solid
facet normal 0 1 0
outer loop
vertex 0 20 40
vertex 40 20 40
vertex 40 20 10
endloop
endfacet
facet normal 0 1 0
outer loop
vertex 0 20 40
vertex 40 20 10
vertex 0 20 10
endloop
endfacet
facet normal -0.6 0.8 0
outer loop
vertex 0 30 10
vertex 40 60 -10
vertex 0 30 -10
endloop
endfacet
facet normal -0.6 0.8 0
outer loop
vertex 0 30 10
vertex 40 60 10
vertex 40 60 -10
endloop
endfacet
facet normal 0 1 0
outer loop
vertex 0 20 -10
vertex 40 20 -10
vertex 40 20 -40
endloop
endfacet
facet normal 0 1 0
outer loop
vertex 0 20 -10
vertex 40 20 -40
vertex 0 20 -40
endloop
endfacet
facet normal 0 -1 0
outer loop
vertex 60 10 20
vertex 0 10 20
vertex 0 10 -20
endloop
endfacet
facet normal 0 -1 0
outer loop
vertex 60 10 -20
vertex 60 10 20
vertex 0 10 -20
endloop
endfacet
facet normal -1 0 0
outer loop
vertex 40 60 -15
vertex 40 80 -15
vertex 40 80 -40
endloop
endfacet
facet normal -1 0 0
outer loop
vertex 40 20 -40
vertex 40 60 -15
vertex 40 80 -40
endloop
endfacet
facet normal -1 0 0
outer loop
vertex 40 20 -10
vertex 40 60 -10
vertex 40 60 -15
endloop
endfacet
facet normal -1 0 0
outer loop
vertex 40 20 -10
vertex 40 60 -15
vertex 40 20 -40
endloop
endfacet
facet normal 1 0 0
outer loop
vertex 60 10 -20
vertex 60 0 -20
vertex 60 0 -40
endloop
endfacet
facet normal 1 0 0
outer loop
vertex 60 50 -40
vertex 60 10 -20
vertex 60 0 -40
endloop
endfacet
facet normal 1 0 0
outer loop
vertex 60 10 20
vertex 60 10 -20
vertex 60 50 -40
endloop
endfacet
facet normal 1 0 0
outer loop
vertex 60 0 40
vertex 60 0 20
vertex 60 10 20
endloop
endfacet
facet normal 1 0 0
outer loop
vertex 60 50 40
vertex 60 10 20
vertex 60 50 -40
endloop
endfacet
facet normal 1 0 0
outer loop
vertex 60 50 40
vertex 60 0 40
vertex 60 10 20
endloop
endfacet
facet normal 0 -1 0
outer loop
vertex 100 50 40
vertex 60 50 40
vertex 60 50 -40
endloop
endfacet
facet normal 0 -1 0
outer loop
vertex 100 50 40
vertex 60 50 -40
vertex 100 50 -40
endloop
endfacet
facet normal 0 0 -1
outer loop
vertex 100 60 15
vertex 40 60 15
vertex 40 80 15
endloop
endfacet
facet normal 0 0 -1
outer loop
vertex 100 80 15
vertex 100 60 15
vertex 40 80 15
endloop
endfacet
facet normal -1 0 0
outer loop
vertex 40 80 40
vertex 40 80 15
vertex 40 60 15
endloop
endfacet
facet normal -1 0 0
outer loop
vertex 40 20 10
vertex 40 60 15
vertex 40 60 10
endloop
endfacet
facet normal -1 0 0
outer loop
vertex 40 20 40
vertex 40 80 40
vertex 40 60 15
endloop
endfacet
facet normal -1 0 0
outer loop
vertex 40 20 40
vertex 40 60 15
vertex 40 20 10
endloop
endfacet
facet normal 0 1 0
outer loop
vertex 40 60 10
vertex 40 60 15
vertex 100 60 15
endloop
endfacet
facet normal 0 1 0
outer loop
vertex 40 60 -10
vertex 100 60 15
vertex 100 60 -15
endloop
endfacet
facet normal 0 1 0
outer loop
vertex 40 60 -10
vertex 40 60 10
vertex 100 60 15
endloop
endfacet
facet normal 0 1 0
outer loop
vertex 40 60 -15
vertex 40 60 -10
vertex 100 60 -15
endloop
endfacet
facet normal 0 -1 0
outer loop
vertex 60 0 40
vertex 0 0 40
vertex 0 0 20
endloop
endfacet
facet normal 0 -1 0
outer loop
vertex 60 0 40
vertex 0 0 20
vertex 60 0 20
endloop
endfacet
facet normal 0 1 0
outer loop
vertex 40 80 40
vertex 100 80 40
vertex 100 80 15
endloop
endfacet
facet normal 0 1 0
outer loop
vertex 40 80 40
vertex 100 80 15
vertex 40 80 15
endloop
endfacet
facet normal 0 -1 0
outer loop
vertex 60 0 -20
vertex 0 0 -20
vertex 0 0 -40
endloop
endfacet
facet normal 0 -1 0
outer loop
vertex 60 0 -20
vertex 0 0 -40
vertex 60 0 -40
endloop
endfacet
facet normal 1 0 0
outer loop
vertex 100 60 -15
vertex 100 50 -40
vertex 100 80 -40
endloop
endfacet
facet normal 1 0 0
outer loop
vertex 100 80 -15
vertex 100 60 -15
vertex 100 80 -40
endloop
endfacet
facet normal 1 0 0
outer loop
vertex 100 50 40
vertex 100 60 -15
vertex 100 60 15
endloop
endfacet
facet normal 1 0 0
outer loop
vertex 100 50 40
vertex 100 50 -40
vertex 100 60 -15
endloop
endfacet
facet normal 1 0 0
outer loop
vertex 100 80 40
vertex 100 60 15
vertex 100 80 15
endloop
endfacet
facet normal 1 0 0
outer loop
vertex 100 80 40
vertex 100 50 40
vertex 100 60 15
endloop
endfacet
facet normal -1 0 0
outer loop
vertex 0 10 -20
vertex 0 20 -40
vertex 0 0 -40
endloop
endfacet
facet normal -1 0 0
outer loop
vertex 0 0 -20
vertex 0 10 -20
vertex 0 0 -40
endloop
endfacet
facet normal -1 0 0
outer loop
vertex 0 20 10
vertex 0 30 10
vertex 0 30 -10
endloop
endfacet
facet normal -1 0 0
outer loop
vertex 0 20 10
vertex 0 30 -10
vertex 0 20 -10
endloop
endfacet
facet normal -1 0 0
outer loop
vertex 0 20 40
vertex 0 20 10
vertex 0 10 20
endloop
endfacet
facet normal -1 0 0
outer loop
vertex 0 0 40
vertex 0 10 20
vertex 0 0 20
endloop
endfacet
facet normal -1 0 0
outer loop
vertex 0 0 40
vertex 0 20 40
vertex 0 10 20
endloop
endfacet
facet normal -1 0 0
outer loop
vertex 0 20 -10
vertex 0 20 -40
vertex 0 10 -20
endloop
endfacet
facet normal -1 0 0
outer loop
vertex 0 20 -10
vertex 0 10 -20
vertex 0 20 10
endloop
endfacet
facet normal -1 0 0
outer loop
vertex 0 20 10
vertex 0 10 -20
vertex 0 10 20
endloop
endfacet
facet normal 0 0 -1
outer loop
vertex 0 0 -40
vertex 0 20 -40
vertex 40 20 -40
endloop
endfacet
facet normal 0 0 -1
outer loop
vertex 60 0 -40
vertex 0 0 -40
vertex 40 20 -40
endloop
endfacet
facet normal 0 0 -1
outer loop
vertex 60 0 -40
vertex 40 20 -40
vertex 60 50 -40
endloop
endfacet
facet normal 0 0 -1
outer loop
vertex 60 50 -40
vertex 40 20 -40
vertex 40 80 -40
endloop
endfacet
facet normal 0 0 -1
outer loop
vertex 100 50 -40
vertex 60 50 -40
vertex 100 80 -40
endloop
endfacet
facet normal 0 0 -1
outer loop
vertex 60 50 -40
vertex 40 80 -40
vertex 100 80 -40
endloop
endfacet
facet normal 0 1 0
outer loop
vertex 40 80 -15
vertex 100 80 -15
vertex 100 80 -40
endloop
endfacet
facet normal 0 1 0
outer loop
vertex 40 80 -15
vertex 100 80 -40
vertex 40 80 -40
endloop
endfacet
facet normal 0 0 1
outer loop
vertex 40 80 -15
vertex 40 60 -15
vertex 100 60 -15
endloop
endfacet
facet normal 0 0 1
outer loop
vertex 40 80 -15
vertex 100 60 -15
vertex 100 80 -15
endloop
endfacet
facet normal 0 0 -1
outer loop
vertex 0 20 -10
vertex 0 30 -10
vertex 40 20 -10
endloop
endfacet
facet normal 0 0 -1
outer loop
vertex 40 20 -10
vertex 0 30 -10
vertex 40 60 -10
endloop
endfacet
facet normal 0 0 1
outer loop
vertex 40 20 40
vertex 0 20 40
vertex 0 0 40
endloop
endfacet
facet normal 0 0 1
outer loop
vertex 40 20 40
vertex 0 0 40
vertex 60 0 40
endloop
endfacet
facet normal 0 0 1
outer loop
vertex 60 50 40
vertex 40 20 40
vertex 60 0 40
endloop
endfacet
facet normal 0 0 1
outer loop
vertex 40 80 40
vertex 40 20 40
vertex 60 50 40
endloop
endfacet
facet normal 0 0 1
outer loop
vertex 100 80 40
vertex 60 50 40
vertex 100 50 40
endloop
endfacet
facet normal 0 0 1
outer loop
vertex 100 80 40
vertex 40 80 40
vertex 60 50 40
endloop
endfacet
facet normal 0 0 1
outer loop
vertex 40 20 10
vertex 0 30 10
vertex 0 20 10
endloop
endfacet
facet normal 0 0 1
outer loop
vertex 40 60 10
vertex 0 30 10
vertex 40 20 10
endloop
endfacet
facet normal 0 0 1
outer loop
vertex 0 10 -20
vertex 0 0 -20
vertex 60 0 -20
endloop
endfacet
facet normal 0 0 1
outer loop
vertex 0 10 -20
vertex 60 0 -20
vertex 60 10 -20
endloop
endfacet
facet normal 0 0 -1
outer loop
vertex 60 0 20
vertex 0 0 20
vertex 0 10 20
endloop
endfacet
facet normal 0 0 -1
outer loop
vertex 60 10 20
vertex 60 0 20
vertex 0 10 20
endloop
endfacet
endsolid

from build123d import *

# Parameters (mm, degrees)
BOSS_EXTRUDE1_DEPTH = 40
BOSS_EXTRUDE2_DEPTH = 10
SKETCH2_W           = 40
SKETCH2_H           = 10
SKETCH2_W_2         = 30
SKETCH2_H_2         = 20
CUT_EXTRUDE1_DEPTH  = 135.16407865


with BuildPart() as part:
    # Sketch1 → Boss-Extrude1 (new, symmetric)
    with BuildSketch(Plane.XY):
        Polygon((0, 20), (0, 0), (60, 0), (60, 50), (100, 50), (100, 80), (40, 80), (40, 60), (40, 20), align=None)
    extrude(amount=BOSS_EXTRUDE1_DEPTH, both=True)

    # Sketch1<3> → Boss-Extrude2 (add, symmetric)
    with BuildSketch(Plane.XY):
        Polygon((0, 30), (0, 20), (40, 20), (40, 60), align=None)
    extrude(amount=BOSS_EXTRUDE2_DEPTH, both=True)

    # Sketch2 → Cut-Extrude1 (cut, through all)
    with BuildSketch(Plane(origin=(0, 0, 0), x_dir=(0, 0, -1), z_dir=(1, 0, 0))):
        with Locations((0, 5)):
            Rectangle(SKETCH2_W, SKETCH2_H)
        with Locations((0, 70)):
            Rectangle(SKETCH2_W_2, SKETCH2_H_2)
    extrude(amount=CUT_EXTRUDE1_DEPTH, mode=Mode.SUBTRACT)


solid = part.part
